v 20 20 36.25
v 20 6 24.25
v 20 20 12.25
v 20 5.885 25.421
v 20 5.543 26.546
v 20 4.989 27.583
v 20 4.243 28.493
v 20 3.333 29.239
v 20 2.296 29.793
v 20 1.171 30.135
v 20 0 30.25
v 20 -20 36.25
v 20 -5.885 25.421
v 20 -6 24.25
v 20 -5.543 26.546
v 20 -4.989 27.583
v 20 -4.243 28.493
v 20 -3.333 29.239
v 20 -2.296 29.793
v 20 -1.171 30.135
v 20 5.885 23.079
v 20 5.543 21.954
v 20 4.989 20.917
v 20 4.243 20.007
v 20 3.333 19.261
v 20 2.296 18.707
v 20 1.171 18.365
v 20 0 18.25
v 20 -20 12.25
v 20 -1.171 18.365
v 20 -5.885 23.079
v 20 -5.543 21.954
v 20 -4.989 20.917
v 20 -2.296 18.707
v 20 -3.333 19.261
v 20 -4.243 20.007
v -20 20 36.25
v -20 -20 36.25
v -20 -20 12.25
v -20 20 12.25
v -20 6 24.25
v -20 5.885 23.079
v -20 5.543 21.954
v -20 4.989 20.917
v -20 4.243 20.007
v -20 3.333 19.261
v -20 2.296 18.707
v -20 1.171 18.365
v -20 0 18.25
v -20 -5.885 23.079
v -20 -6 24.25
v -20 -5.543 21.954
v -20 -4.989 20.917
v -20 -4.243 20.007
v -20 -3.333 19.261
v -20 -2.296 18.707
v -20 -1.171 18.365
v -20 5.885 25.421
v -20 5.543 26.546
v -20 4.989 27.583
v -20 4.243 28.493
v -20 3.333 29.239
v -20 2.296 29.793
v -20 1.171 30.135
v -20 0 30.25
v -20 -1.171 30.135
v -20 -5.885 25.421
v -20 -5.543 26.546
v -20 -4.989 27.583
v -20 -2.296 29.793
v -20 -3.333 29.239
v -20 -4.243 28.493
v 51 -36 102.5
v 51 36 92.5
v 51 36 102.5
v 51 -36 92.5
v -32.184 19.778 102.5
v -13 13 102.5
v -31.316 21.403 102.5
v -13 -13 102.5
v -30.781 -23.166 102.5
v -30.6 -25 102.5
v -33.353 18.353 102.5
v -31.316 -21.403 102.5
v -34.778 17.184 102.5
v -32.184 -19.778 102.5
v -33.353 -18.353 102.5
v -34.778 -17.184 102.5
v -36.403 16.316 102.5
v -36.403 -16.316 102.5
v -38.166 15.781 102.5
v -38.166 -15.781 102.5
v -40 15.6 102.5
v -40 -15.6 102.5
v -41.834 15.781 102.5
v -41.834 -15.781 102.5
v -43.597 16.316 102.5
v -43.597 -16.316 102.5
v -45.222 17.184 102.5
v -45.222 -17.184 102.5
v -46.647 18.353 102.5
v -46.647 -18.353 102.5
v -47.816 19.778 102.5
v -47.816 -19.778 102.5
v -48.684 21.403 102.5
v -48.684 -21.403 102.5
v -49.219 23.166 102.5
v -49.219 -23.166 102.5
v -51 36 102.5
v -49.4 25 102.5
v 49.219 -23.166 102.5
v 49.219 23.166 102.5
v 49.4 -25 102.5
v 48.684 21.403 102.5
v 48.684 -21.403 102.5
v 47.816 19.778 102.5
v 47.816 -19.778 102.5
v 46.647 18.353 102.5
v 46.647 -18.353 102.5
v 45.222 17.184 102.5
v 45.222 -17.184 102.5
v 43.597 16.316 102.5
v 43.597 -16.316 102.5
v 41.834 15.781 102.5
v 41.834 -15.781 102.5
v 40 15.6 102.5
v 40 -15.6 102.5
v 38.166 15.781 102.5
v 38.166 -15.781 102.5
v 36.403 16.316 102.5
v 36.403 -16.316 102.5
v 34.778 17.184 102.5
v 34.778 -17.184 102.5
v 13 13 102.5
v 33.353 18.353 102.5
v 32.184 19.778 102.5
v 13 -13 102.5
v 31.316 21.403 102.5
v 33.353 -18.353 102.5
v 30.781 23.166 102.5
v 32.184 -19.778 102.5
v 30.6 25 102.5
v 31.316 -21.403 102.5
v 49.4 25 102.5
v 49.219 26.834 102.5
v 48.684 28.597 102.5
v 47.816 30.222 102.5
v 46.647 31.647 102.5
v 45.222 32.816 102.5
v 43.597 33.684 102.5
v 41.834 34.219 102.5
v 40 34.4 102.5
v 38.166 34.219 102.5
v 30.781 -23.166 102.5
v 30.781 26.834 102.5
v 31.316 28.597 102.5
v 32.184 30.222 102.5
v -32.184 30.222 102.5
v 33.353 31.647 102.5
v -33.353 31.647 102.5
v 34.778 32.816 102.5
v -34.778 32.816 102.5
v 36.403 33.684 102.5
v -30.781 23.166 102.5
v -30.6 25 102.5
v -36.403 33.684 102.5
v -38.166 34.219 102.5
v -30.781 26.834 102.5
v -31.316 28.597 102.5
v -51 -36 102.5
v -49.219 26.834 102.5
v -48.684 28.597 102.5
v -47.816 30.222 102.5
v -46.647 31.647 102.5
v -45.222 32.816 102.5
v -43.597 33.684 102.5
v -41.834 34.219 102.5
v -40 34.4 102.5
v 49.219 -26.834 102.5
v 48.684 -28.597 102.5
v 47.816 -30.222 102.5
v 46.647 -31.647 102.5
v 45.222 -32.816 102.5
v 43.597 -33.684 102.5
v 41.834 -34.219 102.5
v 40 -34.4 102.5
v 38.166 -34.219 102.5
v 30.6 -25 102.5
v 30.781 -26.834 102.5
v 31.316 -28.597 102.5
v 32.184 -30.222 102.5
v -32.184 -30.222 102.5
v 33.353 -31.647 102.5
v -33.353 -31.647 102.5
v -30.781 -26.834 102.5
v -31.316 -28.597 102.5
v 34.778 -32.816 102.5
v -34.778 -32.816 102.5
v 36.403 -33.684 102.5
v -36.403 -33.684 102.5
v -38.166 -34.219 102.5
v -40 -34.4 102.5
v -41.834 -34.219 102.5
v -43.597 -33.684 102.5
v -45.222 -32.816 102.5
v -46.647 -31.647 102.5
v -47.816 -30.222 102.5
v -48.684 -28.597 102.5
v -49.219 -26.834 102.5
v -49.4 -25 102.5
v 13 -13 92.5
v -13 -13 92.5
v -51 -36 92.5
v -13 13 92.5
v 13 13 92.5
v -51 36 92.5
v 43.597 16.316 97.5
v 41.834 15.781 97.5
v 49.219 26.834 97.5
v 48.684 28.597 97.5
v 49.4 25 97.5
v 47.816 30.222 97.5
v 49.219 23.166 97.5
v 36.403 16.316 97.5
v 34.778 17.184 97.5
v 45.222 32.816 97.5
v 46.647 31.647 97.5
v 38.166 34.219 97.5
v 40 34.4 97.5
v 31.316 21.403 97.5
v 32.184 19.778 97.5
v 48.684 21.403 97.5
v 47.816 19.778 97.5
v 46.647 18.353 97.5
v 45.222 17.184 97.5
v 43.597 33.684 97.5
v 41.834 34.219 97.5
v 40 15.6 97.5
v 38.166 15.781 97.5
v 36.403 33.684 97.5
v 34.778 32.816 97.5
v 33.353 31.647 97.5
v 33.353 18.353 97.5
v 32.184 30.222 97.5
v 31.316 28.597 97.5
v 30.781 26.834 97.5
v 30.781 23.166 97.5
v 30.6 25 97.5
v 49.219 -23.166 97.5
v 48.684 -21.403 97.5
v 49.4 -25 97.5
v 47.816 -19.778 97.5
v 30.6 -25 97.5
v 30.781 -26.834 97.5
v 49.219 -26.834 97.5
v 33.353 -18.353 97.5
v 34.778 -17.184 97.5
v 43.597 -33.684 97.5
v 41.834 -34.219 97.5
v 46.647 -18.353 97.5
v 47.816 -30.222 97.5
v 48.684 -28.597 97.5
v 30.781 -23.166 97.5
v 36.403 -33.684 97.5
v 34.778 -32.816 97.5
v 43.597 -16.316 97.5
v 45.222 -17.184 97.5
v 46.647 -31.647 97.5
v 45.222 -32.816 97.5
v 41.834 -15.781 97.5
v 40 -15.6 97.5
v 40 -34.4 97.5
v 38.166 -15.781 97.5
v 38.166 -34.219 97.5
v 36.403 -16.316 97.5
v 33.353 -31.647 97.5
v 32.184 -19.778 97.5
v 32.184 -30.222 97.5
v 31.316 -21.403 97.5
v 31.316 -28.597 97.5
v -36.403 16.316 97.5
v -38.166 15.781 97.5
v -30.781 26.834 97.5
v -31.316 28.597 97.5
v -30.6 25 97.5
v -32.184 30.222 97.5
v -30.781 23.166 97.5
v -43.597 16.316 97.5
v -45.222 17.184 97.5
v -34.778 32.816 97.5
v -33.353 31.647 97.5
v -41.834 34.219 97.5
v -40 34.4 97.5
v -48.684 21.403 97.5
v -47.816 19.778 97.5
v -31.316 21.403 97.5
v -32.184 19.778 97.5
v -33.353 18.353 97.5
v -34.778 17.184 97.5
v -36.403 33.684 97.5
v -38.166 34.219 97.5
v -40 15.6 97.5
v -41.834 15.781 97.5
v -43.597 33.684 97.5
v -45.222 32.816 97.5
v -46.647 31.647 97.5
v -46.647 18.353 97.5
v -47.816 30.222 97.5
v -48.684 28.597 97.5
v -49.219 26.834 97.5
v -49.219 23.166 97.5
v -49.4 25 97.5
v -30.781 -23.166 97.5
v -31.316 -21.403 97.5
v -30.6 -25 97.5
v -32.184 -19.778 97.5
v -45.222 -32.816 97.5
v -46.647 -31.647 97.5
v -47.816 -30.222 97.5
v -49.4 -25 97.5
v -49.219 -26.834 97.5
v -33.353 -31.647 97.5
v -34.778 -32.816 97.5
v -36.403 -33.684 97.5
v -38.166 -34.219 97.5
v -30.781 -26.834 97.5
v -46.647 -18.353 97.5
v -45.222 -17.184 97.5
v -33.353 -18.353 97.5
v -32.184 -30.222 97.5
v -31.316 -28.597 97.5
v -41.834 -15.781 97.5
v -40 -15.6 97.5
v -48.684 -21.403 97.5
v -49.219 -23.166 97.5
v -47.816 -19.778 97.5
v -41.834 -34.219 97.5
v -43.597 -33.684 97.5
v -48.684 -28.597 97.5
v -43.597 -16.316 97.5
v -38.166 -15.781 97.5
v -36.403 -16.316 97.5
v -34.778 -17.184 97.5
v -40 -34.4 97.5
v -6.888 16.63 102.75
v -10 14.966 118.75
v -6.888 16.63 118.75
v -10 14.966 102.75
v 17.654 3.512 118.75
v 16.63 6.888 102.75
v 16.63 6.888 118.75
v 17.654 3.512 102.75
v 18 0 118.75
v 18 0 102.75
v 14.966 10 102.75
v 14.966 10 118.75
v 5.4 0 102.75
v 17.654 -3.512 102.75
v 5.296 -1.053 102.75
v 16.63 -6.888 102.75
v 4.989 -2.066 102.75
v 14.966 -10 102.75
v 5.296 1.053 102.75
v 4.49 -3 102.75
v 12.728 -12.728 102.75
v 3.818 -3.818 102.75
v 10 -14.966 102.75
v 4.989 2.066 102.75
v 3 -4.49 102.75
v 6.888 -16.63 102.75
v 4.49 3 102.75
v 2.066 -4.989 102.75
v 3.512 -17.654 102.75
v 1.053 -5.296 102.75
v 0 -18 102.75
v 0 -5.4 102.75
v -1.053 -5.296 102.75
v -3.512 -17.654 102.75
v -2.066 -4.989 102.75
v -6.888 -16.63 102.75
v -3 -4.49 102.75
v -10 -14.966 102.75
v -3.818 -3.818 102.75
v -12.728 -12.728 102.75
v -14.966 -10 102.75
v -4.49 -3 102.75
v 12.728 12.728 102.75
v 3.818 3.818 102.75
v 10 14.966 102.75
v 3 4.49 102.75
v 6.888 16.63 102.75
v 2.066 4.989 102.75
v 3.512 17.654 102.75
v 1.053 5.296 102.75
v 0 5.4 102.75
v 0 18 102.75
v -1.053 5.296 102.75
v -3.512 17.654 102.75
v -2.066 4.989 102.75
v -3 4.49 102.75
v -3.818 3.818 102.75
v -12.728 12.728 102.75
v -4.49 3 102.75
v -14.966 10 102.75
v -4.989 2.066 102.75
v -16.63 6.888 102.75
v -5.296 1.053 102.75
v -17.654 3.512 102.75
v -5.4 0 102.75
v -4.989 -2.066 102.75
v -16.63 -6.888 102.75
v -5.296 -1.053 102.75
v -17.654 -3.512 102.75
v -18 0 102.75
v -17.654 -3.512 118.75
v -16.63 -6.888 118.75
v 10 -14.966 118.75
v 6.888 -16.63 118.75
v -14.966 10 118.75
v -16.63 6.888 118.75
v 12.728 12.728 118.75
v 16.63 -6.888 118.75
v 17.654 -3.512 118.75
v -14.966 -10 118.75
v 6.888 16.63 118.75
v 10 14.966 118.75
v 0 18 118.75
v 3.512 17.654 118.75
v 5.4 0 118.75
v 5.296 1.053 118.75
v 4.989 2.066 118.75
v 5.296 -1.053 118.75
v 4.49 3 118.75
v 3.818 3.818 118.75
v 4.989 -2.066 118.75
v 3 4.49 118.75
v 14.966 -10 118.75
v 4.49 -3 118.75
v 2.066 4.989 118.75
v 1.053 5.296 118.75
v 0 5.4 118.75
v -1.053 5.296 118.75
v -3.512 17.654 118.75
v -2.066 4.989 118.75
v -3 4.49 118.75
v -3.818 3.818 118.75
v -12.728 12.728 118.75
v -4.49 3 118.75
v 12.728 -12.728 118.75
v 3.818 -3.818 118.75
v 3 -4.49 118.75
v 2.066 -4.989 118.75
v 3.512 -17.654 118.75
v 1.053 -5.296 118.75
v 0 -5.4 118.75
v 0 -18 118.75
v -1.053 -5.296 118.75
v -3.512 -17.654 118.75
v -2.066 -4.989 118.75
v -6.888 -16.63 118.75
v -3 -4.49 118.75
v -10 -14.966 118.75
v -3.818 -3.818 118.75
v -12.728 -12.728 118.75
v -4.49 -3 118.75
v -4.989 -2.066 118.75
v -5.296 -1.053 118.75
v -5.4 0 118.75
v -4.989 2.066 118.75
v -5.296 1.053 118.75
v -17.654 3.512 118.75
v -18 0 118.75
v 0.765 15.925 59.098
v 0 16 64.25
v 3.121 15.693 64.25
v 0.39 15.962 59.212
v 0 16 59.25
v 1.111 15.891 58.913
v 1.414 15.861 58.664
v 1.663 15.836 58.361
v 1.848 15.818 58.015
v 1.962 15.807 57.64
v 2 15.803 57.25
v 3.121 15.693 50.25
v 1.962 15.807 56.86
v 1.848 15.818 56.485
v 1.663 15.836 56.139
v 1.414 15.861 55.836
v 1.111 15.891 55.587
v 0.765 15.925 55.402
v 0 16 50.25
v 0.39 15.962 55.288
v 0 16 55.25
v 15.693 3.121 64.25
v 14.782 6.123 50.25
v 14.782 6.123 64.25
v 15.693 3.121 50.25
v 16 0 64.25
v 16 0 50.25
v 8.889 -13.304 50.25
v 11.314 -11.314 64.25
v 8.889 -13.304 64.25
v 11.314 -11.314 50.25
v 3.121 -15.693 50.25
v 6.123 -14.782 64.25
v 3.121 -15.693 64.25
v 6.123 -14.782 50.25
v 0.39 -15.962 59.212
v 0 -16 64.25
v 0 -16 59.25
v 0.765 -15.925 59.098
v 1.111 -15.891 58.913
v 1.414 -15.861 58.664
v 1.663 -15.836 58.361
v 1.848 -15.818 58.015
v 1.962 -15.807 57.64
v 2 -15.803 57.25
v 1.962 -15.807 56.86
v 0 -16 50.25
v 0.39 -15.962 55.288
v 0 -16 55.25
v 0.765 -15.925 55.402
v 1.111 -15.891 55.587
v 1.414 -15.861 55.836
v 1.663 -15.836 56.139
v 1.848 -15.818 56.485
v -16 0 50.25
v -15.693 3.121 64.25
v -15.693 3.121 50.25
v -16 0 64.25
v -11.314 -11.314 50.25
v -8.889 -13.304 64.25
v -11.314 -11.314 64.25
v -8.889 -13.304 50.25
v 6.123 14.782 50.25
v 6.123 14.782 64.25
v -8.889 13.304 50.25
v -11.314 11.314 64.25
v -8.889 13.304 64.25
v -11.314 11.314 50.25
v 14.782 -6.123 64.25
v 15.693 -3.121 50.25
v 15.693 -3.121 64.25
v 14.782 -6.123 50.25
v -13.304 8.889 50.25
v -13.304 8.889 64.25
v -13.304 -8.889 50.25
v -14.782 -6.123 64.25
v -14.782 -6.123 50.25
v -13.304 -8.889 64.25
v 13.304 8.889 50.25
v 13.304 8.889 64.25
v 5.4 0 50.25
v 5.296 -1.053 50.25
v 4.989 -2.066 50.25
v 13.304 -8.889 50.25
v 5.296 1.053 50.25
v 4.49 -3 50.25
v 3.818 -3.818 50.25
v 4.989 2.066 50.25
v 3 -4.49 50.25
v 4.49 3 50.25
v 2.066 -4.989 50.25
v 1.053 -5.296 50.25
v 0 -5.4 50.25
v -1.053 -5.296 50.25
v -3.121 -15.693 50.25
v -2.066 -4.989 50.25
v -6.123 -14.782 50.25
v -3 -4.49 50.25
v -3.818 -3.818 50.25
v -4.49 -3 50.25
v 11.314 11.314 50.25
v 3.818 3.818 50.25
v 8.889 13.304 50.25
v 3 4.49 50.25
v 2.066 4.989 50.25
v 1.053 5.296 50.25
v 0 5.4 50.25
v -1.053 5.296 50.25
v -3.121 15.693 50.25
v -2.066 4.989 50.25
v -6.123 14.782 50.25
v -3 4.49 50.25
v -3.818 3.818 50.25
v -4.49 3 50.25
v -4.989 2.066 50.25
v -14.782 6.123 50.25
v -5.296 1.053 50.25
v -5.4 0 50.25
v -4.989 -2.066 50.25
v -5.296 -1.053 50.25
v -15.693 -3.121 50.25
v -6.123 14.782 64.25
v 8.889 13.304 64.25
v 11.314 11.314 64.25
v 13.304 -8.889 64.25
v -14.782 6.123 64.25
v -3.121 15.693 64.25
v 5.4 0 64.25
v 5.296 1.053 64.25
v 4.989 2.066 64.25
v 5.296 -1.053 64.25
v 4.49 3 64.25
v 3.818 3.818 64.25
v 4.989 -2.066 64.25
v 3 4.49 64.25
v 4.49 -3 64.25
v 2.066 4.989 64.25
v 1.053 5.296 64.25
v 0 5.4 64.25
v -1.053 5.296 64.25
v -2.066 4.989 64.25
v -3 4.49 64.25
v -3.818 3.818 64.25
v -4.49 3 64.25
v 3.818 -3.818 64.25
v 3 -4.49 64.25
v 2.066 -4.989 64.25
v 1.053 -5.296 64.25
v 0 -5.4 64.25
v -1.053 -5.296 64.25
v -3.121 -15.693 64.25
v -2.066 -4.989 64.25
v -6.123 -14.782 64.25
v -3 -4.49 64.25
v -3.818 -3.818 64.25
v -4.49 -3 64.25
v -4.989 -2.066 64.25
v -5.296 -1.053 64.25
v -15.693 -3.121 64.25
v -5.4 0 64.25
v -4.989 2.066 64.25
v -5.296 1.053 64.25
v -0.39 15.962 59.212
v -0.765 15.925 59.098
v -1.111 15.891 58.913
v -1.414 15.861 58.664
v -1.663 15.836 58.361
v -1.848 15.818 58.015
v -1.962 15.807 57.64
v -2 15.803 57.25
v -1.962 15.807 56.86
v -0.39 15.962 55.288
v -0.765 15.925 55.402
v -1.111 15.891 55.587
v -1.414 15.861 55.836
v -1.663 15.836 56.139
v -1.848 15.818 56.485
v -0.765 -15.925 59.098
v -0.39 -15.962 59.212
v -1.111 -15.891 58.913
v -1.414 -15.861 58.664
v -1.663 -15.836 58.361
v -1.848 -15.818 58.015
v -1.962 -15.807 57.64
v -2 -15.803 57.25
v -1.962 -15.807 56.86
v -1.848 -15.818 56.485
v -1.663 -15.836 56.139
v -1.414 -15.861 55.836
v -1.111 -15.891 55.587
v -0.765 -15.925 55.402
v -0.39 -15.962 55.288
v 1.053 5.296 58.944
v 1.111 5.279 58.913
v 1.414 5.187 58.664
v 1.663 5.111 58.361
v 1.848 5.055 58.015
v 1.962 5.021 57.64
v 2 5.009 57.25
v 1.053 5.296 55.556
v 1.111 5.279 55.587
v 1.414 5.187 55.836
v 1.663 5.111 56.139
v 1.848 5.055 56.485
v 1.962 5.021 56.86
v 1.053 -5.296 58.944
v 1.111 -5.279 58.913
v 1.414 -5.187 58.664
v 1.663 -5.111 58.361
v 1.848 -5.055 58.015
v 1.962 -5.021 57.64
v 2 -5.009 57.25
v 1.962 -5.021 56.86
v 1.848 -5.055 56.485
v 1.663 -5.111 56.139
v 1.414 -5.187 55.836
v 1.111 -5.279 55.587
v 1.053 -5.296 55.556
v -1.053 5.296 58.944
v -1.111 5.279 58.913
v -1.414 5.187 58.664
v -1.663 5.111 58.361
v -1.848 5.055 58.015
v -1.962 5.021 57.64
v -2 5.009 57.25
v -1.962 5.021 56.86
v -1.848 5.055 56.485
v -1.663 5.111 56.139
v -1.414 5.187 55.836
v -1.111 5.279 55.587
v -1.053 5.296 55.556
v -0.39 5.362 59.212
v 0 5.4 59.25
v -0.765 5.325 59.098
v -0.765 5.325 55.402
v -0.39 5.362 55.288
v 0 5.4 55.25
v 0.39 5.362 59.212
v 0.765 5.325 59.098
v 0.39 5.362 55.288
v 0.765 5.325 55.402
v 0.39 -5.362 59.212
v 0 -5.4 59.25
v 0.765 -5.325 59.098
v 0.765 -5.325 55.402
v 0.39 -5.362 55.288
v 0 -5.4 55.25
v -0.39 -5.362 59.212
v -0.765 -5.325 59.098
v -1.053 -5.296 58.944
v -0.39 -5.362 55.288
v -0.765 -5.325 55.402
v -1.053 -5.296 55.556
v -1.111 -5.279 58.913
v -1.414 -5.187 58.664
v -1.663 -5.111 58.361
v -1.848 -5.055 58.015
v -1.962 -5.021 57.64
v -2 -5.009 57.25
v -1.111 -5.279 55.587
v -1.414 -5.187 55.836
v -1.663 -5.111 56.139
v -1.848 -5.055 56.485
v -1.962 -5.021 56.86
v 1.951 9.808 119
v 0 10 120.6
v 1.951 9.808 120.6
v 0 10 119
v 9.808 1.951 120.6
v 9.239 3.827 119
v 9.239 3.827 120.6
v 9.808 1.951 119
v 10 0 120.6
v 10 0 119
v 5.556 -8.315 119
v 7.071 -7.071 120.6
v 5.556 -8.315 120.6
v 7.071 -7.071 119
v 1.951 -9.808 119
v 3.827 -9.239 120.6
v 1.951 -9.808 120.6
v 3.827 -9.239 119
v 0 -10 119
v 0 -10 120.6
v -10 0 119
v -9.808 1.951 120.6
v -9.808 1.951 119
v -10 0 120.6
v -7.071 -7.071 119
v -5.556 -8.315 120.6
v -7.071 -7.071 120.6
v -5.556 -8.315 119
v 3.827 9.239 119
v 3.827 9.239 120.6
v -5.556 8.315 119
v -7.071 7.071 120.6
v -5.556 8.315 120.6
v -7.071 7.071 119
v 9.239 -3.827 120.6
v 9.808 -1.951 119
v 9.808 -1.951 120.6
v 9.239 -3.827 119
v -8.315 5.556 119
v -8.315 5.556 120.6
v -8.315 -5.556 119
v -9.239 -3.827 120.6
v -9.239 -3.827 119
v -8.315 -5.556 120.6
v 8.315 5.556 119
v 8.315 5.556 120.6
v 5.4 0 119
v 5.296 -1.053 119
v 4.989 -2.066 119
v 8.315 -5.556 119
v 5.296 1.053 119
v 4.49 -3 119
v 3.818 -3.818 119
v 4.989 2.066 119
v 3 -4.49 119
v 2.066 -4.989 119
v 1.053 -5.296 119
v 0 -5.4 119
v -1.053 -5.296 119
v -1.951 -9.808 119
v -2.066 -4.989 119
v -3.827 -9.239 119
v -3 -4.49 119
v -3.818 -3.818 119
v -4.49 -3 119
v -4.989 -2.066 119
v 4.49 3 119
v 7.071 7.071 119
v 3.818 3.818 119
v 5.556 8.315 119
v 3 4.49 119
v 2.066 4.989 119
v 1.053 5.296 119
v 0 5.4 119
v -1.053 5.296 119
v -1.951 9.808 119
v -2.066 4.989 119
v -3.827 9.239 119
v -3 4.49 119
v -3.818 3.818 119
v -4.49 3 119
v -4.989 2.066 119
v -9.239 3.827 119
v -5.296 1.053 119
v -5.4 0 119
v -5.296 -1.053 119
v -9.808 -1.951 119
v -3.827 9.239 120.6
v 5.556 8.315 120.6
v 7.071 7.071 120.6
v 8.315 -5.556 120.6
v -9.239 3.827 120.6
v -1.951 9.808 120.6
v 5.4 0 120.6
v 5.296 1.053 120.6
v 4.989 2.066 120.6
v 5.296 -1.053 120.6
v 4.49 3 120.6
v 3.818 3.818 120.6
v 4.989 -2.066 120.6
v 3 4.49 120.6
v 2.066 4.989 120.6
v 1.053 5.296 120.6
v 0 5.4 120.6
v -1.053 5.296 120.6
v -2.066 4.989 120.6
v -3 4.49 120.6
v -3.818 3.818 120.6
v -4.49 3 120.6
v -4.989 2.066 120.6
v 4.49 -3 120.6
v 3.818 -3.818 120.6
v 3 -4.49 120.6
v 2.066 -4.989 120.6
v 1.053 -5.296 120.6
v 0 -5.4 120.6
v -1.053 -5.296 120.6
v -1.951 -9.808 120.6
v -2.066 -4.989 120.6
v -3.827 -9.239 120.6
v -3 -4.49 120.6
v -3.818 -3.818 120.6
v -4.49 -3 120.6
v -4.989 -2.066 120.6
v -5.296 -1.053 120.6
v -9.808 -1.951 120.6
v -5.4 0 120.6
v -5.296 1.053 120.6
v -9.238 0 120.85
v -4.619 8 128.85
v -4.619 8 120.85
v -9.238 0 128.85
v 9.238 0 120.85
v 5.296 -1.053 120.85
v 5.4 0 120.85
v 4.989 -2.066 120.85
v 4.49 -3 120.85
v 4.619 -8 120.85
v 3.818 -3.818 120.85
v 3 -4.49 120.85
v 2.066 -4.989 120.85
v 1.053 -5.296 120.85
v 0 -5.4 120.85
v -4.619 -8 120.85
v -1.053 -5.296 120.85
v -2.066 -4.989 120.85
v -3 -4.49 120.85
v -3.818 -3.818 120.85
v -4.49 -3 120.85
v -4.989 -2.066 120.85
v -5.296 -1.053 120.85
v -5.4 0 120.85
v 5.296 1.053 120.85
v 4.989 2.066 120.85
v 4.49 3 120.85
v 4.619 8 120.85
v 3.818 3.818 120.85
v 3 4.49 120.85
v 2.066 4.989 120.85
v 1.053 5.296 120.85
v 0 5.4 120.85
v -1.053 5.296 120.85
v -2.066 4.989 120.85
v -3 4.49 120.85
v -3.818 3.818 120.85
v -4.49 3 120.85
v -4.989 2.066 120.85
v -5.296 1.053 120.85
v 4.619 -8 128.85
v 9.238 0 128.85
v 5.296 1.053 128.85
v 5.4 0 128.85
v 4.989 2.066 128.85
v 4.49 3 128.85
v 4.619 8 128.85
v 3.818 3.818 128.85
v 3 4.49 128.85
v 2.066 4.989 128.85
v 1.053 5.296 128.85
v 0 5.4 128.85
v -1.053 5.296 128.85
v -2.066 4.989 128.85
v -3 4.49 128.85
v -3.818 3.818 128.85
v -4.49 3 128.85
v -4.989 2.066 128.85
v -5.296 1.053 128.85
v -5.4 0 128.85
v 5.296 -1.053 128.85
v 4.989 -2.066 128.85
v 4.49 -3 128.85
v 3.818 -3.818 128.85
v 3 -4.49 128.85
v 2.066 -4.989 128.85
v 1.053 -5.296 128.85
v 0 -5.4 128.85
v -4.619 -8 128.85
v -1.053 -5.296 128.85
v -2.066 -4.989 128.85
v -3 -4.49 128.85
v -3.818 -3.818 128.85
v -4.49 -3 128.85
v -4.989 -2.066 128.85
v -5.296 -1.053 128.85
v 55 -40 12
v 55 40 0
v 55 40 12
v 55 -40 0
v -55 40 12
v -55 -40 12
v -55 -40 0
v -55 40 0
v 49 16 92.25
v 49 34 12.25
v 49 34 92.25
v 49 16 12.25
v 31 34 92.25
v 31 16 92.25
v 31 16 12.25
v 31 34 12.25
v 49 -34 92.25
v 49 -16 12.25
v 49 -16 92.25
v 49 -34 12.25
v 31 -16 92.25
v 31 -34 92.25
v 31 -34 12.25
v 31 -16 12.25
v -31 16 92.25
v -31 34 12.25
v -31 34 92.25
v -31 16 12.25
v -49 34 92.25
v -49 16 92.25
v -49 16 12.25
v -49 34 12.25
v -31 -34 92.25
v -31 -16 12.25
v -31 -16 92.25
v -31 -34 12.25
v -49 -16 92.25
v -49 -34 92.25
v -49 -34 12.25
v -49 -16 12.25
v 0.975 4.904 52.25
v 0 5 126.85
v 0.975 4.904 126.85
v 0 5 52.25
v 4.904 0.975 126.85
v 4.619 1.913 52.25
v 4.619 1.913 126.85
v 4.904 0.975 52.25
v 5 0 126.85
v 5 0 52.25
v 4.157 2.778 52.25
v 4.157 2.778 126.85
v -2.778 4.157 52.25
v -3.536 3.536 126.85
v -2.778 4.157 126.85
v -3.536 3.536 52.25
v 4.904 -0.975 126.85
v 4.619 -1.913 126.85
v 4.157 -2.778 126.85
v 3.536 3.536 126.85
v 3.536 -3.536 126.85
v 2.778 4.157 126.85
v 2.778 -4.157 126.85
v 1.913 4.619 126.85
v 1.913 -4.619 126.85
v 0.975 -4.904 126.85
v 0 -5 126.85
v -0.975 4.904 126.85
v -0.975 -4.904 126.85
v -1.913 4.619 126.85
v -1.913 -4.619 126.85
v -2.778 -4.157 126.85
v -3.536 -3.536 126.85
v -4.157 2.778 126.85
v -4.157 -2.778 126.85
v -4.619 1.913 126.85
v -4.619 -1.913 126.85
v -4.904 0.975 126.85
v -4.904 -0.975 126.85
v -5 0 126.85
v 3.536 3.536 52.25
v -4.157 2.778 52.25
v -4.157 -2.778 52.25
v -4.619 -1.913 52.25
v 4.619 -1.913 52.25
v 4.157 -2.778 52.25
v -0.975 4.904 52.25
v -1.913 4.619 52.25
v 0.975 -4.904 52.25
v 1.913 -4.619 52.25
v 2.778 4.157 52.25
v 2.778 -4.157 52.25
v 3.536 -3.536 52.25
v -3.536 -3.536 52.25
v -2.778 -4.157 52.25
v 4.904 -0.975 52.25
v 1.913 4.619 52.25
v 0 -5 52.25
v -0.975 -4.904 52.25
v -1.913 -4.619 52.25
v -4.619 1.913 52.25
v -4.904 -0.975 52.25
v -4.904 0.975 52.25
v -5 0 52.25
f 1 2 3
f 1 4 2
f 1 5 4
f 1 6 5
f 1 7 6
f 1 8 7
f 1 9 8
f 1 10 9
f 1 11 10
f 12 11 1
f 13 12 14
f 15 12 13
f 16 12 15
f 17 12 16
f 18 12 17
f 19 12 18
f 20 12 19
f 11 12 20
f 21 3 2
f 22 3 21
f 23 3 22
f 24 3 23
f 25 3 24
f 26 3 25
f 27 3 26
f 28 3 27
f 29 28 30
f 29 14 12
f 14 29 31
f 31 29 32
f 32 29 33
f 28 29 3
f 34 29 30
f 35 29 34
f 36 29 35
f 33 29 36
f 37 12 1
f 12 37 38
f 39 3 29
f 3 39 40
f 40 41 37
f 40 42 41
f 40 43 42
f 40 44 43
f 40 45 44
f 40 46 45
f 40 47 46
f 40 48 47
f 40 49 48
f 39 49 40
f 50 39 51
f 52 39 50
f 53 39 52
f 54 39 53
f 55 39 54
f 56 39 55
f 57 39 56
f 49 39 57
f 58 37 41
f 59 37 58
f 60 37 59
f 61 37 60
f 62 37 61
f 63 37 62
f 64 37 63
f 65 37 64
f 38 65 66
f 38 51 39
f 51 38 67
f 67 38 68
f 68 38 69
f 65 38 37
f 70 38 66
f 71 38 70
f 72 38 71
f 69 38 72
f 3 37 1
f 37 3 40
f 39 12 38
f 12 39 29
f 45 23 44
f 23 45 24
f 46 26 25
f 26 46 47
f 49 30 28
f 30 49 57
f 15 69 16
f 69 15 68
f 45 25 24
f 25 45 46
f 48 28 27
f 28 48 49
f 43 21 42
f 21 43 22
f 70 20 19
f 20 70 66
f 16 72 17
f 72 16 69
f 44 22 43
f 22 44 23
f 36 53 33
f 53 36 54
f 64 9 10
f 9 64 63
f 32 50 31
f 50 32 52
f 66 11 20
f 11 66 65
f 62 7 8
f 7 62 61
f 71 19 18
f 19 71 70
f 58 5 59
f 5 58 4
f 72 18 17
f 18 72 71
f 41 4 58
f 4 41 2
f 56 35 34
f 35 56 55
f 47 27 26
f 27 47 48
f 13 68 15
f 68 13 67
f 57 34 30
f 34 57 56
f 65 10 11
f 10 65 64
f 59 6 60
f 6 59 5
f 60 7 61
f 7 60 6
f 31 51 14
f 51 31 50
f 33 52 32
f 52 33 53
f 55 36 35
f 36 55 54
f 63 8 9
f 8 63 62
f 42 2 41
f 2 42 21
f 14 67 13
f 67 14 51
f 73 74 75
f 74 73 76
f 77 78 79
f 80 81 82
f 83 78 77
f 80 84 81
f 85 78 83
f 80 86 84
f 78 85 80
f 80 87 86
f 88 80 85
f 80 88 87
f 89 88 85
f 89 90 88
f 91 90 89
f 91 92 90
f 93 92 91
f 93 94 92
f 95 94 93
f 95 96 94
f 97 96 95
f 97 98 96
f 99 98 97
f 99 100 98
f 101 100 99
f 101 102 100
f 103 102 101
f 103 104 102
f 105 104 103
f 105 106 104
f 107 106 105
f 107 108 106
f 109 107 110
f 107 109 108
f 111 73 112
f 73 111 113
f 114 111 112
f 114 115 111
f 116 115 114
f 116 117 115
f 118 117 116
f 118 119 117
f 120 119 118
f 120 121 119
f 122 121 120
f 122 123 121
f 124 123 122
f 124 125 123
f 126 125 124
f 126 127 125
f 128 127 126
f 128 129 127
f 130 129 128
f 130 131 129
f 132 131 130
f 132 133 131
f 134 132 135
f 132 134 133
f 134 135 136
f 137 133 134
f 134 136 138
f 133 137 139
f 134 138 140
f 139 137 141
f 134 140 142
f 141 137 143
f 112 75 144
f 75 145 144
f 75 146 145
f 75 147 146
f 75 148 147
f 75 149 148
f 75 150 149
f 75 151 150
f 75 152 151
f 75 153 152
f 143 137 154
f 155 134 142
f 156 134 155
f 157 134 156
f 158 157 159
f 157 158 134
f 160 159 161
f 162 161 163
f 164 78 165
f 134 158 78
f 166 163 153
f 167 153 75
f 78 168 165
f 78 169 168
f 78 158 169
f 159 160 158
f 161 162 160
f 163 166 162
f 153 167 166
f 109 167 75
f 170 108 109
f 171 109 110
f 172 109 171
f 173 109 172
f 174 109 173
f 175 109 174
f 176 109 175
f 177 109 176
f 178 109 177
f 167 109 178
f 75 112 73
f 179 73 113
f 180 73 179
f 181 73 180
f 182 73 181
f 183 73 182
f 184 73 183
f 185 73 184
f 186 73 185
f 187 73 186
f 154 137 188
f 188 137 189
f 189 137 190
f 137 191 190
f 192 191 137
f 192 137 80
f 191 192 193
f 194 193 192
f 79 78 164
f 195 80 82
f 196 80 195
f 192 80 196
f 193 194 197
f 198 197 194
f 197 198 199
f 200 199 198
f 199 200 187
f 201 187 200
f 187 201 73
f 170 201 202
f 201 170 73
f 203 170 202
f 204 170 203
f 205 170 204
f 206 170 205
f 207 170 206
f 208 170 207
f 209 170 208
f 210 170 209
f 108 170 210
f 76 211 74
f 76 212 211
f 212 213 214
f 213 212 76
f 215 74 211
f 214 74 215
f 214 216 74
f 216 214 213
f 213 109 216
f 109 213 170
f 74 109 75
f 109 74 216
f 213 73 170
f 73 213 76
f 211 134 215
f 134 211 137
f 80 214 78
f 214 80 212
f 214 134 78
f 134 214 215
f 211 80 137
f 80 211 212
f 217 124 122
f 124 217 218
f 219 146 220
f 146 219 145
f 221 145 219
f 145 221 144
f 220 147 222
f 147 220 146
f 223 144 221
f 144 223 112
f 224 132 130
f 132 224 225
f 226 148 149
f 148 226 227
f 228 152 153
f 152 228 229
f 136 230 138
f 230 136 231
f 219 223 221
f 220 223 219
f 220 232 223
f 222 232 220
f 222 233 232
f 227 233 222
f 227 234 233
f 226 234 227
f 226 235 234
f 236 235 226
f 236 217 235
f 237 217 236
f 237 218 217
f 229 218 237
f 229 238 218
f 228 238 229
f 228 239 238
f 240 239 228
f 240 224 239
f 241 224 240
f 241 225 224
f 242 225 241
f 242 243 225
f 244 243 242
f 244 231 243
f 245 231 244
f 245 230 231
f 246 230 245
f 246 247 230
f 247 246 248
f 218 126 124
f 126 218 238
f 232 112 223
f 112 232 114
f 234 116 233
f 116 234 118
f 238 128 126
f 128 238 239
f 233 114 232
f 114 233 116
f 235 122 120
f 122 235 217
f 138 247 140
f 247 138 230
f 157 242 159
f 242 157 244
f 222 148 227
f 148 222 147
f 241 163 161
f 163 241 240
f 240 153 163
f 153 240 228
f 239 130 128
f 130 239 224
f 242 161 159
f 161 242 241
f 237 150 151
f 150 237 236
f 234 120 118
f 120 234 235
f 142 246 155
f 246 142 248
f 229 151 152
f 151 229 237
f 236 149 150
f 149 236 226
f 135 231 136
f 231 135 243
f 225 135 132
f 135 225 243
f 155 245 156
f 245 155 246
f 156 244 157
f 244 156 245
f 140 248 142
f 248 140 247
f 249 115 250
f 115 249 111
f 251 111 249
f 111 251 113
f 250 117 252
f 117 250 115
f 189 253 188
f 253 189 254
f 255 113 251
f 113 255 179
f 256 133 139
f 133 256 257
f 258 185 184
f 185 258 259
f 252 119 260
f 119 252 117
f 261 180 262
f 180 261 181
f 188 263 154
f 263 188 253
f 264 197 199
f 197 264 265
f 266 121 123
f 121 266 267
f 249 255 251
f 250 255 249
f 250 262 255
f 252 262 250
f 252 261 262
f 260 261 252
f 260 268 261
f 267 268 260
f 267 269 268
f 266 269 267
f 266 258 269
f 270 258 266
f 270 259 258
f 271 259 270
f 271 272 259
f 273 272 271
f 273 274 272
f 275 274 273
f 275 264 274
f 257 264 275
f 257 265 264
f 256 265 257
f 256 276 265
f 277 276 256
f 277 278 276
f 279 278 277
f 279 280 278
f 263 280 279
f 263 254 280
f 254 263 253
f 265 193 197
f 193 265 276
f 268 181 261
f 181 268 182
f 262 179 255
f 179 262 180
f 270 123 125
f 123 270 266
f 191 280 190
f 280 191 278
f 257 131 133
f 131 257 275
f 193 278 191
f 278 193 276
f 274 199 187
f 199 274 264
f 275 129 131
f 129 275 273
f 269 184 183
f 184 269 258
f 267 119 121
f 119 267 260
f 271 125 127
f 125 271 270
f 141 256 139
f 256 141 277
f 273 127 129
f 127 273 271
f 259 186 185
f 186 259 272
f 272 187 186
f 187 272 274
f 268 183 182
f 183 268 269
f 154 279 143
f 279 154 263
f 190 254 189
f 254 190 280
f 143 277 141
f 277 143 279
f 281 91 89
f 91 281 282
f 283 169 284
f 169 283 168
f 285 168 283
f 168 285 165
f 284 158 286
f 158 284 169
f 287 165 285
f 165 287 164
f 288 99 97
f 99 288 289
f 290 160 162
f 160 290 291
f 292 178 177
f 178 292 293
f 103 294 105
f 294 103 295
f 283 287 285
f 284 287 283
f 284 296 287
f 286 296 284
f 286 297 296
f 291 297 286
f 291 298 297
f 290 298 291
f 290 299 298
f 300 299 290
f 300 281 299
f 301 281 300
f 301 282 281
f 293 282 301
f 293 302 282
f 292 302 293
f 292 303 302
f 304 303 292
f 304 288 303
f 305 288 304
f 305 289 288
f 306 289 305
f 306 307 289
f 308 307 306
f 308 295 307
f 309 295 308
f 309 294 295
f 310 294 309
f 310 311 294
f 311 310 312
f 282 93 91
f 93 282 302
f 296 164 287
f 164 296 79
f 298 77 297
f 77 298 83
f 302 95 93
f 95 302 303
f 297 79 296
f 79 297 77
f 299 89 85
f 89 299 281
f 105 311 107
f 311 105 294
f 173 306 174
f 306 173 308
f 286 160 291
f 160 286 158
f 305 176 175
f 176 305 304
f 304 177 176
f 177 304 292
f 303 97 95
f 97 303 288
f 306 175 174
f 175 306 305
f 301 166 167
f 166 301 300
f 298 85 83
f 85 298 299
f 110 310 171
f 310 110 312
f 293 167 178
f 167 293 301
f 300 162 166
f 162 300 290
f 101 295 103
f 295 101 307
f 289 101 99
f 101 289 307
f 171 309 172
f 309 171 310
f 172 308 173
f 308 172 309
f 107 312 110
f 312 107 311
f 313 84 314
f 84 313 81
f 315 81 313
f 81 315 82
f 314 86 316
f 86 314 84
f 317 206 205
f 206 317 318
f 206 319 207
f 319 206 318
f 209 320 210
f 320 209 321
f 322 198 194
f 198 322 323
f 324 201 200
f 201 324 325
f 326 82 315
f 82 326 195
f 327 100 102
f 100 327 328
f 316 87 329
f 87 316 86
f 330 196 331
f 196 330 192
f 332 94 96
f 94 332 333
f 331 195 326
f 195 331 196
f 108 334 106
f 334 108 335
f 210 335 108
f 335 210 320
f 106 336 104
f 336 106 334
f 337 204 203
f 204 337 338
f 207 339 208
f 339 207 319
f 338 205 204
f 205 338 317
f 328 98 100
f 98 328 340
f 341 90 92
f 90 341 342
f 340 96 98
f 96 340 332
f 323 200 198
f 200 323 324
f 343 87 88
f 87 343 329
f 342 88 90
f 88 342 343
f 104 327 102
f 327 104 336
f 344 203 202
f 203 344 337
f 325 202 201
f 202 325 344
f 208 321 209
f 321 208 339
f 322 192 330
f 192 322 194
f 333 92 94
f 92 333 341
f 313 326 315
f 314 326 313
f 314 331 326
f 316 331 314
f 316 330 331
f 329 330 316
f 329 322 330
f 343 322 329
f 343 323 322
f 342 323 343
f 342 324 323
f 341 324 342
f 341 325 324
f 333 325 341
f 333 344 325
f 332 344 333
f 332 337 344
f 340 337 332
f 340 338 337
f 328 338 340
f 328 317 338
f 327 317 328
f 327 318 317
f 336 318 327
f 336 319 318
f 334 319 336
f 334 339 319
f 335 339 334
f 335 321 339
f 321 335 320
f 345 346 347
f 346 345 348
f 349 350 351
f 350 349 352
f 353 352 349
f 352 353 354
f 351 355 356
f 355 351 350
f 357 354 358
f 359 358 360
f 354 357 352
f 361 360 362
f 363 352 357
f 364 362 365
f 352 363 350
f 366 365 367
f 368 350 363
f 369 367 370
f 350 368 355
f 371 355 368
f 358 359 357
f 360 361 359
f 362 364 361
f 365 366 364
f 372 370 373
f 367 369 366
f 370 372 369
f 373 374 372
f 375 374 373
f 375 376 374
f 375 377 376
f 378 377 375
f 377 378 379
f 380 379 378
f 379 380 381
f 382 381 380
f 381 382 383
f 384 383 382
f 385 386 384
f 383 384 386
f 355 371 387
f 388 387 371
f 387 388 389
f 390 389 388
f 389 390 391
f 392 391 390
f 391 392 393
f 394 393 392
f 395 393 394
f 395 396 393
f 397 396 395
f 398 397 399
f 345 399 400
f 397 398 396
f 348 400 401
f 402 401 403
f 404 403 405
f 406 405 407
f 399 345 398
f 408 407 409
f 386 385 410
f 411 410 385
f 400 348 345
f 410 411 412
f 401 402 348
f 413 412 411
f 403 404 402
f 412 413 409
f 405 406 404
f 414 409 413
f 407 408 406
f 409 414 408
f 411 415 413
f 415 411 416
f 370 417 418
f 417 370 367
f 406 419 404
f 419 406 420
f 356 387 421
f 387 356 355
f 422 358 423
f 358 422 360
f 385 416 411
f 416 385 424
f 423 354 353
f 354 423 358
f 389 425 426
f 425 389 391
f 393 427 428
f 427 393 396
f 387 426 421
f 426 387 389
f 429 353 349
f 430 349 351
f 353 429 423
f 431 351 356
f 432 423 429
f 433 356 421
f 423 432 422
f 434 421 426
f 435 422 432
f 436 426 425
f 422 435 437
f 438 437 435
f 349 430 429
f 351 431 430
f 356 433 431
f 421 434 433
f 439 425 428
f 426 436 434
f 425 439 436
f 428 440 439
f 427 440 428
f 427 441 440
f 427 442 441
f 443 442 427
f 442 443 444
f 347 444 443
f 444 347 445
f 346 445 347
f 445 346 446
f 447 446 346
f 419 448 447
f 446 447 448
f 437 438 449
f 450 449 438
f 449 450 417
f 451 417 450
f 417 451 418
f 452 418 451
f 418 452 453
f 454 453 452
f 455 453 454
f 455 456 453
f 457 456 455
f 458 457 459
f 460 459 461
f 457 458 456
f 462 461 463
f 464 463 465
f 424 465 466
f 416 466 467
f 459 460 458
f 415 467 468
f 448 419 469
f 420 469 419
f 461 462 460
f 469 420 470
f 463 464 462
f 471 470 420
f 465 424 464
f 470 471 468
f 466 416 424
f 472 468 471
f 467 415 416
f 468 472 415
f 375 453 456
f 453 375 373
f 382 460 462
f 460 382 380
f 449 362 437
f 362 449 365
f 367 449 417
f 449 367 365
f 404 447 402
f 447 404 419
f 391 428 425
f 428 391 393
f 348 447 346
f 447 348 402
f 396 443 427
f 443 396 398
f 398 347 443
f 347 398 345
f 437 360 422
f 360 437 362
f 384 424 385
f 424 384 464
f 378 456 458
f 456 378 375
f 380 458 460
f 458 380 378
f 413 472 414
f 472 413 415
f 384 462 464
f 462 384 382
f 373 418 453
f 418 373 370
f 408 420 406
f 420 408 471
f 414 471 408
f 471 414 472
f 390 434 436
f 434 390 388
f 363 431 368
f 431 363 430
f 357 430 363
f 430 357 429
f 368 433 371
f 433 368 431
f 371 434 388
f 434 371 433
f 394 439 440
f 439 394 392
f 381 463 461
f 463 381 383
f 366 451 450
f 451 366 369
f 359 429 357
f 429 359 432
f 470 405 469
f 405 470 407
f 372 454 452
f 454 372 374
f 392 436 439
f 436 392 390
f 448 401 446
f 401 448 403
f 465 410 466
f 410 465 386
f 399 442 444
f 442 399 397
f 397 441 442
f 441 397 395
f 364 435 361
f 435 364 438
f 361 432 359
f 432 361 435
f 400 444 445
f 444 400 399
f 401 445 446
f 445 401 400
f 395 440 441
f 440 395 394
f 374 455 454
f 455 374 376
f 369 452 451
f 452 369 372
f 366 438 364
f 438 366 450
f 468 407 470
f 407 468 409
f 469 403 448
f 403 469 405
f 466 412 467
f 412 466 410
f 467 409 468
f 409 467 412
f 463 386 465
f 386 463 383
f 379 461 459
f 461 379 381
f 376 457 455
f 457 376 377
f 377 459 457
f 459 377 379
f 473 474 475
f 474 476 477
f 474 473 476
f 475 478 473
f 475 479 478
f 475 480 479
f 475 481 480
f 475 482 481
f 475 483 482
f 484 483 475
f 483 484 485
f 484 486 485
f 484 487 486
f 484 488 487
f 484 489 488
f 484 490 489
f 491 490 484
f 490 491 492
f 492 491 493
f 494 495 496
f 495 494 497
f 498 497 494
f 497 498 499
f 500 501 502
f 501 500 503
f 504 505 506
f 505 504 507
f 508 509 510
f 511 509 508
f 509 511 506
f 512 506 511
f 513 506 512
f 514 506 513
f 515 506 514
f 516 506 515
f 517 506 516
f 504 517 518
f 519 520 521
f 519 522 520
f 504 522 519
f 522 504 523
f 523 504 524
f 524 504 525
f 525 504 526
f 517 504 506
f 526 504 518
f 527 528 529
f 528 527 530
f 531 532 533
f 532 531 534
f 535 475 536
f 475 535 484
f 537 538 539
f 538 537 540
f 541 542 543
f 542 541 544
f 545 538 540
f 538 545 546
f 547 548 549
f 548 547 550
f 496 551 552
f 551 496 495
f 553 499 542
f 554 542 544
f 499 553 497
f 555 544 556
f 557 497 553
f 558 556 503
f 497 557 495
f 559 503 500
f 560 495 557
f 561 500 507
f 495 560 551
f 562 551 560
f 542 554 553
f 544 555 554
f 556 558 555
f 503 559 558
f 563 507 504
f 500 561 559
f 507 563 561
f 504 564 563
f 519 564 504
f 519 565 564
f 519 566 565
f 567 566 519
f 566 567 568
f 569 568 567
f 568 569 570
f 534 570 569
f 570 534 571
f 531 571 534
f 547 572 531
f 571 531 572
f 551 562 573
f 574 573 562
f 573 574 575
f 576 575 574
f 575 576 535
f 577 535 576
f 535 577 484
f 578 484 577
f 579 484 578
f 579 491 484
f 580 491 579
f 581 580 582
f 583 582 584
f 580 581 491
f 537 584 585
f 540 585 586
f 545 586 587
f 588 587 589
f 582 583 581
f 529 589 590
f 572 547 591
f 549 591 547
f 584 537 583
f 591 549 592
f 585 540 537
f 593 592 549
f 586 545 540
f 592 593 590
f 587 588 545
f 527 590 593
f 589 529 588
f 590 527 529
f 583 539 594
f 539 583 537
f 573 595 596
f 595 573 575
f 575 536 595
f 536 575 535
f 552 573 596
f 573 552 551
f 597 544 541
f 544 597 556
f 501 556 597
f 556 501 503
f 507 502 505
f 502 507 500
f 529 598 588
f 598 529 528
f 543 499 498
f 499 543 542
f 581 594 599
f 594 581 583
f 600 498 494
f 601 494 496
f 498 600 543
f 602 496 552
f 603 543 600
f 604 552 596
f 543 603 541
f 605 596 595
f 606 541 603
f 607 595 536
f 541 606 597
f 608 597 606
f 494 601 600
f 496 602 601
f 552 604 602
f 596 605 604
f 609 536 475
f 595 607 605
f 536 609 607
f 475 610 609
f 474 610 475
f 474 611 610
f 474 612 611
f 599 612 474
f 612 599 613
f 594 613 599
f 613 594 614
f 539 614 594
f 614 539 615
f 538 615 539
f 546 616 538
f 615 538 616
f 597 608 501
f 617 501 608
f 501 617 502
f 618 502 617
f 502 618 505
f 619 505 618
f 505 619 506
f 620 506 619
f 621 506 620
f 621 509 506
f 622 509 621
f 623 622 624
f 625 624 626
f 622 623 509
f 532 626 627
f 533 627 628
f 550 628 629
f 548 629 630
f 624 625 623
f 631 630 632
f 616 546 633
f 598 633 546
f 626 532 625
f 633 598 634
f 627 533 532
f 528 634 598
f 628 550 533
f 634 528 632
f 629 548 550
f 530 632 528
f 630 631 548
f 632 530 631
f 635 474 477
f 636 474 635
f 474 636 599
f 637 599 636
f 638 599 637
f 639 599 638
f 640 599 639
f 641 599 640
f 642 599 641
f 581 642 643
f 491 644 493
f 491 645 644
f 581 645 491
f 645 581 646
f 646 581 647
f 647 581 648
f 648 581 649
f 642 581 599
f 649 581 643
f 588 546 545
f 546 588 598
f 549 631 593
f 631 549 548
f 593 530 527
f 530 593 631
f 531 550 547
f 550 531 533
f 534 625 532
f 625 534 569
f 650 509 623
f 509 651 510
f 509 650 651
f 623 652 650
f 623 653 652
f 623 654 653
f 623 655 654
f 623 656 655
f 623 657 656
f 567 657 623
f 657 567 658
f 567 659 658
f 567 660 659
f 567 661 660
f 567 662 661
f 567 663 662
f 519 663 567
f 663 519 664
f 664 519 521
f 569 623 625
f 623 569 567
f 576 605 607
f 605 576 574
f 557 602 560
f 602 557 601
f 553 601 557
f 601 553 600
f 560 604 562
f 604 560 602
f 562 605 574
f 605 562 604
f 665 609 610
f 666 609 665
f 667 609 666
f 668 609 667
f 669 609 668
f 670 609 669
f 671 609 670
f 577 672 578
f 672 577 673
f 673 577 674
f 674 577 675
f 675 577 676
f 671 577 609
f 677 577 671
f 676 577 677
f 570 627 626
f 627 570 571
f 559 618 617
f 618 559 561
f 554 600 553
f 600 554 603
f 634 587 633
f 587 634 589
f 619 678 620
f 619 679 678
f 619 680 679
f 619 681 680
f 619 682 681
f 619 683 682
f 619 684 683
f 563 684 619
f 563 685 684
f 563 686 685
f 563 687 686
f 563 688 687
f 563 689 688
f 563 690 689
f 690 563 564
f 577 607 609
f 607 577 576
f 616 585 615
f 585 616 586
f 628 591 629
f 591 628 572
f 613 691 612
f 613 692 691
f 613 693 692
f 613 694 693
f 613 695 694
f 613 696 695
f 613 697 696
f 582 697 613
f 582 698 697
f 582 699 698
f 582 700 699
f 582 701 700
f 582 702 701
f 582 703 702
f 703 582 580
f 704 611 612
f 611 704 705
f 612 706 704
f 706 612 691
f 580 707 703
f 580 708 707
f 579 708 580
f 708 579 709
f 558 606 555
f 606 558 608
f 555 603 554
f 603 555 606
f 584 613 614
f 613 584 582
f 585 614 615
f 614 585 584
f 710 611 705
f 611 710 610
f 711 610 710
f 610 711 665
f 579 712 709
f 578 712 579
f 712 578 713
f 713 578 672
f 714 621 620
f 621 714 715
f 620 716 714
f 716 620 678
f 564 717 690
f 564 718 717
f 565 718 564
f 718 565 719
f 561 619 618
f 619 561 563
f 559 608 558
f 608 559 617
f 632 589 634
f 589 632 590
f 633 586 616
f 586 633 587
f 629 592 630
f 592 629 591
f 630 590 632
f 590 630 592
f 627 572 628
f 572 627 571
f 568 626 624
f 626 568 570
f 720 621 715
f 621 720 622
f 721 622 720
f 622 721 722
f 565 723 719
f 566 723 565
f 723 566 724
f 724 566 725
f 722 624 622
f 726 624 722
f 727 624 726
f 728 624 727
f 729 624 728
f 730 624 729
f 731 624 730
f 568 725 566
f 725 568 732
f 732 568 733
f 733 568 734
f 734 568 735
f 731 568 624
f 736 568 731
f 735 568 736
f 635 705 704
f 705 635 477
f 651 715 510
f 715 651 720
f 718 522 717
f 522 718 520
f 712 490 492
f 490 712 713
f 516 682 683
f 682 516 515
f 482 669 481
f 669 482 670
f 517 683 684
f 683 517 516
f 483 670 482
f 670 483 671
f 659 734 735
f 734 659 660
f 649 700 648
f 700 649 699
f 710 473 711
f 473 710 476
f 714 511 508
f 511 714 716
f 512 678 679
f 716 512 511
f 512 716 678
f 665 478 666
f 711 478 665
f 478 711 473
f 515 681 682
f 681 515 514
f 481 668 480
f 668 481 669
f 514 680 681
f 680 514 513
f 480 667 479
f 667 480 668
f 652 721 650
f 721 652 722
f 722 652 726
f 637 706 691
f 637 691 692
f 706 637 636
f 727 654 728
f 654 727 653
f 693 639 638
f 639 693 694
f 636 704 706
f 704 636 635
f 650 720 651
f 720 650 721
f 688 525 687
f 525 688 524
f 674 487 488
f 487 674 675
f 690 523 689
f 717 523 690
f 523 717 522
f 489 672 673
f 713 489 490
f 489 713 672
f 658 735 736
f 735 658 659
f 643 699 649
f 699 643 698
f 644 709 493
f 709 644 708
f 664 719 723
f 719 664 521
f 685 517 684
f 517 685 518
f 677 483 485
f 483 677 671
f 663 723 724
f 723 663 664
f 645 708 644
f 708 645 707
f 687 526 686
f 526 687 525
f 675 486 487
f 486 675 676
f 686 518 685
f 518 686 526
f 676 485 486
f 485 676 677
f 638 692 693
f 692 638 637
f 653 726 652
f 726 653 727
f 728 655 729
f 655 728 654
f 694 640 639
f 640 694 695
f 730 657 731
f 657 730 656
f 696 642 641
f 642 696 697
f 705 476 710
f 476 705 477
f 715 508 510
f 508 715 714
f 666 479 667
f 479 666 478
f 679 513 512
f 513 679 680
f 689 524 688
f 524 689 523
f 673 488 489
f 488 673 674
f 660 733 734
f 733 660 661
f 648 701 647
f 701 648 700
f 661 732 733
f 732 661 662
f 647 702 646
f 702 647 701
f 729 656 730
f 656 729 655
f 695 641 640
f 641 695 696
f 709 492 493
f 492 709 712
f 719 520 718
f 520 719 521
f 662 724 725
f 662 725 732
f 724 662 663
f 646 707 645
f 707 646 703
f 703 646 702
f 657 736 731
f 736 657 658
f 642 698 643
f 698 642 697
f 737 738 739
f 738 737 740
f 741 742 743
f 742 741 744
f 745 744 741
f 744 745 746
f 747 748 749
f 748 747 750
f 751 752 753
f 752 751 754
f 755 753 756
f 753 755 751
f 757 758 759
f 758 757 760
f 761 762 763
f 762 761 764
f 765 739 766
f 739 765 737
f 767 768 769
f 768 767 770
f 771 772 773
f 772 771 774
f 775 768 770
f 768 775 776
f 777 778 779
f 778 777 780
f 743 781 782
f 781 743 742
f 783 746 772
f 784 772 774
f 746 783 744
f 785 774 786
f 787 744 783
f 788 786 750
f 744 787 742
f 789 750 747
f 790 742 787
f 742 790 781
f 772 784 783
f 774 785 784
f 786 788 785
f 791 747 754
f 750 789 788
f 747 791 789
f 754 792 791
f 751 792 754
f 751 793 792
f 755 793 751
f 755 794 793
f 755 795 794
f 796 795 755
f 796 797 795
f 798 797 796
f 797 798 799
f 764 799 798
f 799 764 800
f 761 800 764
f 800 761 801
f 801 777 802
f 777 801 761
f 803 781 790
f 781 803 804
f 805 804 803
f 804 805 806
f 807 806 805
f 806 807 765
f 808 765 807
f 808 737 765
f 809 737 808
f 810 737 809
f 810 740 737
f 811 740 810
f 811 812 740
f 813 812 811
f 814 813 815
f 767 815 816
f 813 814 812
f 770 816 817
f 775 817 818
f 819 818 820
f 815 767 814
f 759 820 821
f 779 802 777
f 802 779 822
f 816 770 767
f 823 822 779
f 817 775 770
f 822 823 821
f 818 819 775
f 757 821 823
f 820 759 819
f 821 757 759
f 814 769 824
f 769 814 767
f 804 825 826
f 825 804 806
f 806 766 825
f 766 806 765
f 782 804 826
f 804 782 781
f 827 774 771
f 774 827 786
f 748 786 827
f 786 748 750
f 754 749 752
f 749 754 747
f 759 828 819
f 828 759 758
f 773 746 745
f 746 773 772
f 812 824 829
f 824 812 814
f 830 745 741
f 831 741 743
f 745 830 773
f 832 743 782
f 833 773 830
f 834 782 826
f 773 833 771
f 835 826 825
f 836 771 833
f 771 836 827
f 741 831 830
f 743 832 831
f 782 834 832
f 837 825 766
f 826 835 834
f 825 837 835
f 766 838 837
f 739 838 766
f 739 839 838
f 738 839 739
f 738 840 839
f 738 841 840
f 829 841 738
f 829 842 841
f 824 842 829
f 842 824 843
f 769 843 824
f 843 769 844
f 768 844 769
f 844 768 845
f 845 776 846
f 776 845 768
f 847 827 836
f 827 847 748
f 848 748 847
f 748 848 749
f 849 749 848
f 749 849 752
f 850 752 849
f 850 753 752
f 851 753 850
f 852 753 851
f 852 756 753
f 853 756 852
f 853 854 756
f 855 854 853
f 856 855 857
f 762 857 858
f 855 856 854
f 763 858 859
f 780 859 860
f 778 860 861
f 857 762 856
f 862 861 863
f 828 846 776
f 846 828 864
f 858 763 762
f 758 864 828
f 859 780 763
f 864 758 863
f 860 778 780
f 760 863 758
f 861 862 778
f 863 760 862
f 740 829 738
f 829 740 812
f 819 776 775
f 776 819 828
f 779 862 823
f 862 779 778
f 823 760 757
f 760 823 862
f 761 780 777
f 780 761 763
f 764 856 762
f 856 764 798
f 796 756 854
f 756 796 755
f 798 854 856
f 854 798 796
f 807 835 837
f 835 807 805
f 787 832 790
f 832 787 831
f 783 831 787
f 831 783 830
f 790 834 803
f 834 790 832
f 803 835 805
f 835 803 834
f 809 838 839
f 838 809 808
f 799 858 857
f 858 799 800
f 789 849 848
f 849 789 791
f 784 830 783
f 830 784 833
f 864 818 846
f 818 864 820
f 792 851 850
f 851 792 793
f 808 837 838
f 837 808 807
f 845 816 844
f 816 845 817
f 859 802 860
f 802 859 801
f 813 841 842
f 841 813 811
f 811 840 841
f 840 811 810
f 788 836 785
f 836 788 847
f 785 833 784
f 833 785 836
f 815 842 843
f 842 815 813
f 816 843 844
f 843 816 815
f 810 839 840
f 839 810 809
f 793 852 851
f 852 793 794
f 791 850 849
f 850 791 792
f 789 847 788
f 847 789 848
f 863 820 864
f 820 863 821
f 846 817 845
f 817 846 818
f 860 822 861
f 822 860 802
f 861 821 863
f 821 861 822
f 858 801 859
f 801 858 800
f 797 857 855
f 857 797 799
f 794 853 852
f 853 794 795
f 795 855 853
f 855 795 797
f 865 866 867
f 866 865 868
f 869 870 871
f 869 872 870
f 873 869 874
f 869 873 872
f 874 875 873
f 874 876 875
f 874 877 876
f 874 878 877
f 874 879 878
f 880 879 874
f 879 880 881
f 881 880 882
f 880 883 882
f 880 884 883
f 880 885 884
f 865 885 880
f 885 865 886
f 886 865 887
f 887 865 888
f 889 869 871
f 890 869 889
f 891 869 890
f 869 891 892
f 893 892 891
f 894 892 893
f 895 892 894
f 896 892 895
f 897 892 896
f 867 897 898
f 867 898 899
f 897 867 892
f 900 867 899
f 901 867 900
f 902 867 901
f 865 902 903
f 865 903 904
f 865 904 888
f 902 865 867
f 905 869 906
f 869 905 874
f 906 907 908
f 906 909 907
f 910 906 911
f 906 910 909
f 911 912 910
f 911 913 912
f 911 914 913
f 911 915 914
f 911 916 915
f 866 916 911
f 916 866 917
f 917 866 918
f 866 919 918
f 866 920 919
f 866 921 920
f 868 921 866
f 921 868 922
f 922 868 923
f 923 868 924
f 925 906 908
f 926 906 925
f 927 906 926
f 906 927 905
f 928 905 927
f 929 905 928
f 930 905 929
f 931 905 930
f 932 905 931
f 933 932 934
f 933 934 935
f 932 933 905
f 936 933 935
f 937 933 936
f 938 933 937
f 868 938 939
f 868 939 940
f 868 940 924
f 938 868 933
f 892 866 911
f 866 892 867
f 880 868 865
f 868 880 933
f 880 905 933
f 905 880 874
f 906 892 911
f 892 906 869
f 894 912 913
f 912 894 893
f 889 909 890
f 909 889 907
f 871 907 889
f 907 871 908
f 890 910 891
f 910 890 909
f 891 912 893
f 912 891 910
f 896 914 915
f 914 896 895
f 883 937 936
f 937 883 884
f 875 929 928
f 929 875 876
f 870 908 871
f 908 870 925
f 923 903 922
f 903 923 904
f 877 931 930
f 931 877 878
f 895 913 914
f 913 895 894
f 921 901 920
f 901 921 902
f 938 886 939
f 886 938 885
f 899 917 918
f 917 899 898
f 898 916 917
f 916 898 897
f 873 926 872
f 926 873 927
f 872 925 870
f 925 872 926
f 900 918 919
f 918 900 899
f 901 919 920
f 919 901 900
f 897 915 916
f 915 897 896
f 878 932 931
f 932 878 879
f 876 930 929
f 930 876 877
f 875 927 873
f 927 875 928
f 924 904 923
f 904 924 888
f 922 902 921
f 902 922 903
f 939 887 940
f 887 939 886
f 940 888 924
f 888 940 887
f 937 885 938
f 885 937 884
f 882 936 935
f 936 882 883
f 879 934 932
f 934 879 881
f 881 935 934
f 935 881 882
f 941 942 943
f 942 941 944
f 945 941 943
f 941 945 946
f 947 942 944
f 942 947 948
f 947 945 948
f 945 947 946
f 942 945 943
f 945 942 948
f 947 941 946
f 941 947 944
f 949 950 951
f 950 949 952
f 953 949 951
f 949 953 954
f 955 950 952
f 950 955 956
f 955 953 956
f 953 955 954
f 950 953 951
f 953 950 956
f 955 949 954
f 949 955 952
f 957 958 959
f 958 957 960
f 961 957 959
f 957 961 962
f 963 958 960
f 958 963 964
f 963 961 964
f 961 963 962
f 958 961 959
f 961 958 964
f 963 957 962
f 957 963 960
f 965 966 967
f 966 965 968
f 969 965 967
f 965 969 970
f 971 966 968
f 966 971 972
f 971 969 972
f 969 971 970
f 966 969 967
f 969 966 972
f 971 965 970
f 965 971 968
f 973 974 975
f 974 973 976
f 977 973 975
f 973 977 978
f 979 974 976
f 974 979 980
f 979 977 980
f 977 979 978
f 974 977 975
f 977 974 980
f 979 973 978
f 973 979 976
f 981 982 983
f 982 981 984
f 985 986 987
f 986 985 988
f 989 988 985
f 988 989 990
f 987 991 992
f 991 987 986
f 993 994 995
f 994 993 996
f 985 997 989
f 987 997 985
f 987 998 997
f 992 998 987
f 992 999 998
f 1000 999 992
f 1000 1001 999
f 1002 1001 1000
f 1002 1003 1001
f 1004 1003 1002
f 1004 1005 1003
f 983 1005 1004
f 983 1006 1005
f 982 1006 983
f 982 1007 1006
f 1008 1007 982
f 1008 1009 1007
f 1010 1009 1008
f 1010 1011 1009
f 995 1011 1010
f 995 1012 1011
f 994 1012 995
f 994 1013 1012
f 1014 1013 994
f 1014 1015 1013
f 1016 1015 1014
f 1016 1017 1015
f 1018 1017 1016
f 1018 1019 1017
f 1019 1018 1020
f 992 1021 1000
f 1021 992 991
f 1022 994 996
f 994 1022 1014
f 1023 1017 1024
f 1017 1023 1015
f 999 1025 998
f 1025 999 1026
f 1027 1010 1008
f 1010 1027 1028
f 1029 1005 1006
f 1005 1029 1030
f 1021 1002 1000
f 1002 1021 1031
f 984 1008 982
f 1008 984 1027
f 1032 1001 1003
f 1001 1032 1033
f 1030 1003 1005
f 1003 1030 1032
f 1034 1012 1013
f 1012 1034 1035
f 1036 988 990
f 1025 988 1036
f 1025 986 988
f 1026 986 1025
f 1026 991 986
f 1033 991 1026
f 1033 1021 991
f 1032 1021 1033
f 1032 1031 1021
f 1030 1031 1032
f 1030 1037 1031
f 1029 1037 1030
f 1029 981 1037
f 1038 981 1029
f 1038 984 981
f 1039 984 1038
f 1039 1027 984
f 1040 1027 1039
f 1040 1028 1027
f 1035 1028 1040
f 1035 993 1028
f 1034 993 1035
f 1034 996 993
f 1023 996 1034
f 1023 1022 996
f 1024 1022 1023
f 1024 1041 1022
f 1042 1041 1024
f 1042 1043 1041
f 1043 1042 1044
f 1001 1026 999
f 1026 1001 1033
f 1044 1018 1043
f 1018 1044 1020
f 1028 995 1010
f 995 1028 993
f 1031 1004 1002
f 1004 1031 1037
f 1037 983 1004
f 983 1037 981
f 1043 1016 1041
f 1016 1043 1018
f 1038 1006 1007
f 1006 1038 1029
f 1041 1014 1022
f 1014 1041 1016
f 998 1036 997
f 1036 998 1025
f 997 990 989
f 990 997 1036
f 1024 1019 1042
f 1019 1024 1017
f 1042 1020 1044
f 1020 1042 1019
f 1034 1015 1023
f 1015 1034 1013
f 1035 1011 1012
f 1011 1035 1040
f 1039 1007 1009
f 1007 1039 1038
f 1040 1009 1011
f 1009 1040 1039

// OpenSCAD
$fn = 32;

// ------------------------------------------------------------------------
// Arbor press fixture: screw d10, posts 80 mm, gap 14 mm
// Every part is its own module, assembly() places every instance.
// ------------------------------------------------------------------------

// --- part 1 ---
module press_bed() {
  difference() {
    translate([-55, -40, 0]) cube([110, 80, 12]);
  }
}

// --- part 2 ---
module anvil_block() {
  difference() {
    translate([-20, -20, 0]) cube([40, 40, 24]);
    translate([0, 0, 12]) rotate([0, 90, 0]) cylinder(h = 42, d = 12, center = true);
  }
}

// --- part 3 ---
module press_post_a() {
  translate([-9, -9, 0]) cube([18, 18, 80]);
}

// --- part 4 ---
module press_post_b() {
  translate([-9, -9, 0]) cube([18, 18, 80]);
}

// --- part 5 ---
module press_post_c() {
  translate([-9, -9, 0]) cube([18, 18, 80]);
}

// --- part 6 ---
module press_post_d() {
  translate([-9, -9, 0]) cube([18, 18, 80]);
}

// --- part 7 ---
module press_frame() {
  difference() {
    translate([-51, -36, 0]) cube([102, 72, 10]);
    translate([-13, -13, -1]) cube([26, 26, 12]);
    translate([40, 25, 5]) cylinder(h = 6, d = 18.8);
    translate([40, -25, 5]) cylinder(h = 6, d = 18.8);
    translate([-40, 25, 5]) cylinder(h = 6, d = 18.8);
    translate([-40, -25, 5]) cylinder(h = 6, d = 18.8);
  }
}

// --- part 8 ---
module guide_ring() {
  difference() {
      translate([0, 0, 0]) cylinder(h = 16, d = 36);
      translate([0, 0, -1]) cylinder(h = 18, d = 10.8);
    }
}

// --- part 9 ---
module press_screw() {
  translate([0, 0, -37.3]) cylinder(h = 74.6, d = 10);
}

// --- part 10 ---
module press_head() {
  difference() {
    cylinder(h = 14, d = 32);
    translate([0, 0, -1]) cylinder(h = 16, d = 10.8);
    translate([0, 0, 7]) rotate([90, 0, 0]) cylinder(h = 34, d = 4, center = true);
  }
}

// --- part 11 ---
module nut_washer() {
  difference() {
      translate([0, 0, 0]) cylinder(h = 1.6, d = 20);
      translate([0, 0, -1]) cylinder(h = 3.6, d = 10.8);
    }
}

// --- part 12 ---
module press_nut() {
  difference() {
    linear_extrude(height = 8) polygon(points = [[9.238, 0], [4.619, 8], [-4.619, 8], [-9.238, 0], [-4.619, -8], [4.619, -8]]);
    translate([0, 0, -1]) cylinder(h = 10, d = 10.8);
  }
}

// --- assembly ---
module assembly() {
  color([0.80, 0.24, 0.20]) translate([0, 0, 0]) rotate([0, 0, 0]) press_bed();
  color([0.20, 0.45, 0.75]) translate([0, 0, 12.25]) rotate([0, 0, 0]) anvil_block();
  color([0.25, 0.62, 0.32]) translate([40, 25, 12.25]) rotate([0, 0, 0]) press_post_a();
  color([0.92, 0.70, 0.18]) translate([40, -25, 12.25]) rotate([0, 0, 0]) press_post_b();
  color([0.58, 0.35, 0.70]) translate([-40, 25, 12.25]) rotate([0, 0, 0]) press_post_c();
  color([0.16, 0.66, 0.66]) translate([-40, -25, 12.25]) rotate([0, 0, 0]) press_post_d();
  color([0.85, 0.48, 0.18]) translate([0, 0, 92.5]) rotate([0, 0, 0]) press_frame();
  color([0.55, 0.60, 0.65]) translate([0, 0, 102.75]) rotate([0, 0, 0]) guide_ring();
  color([0.75, 0.30, 0.55]) translate([0, 0, 89.55]) rotate([0, 0, 0]) press_screw();
  color([0.42, 0.52, 0.28]) translate([0, 0, 50.25]) rotate([0, 0, 0]) press_head();
  color([0.80, 0.24, 0.20]) translate([0, 0, 119]) rotate([0, 0, 0]) nut_washer();
  color([0.20, 0.45, 0.75]) translate([0, 0, 120.85]) rotate([0, 0, 0]) press_nut();
}

assembly();
